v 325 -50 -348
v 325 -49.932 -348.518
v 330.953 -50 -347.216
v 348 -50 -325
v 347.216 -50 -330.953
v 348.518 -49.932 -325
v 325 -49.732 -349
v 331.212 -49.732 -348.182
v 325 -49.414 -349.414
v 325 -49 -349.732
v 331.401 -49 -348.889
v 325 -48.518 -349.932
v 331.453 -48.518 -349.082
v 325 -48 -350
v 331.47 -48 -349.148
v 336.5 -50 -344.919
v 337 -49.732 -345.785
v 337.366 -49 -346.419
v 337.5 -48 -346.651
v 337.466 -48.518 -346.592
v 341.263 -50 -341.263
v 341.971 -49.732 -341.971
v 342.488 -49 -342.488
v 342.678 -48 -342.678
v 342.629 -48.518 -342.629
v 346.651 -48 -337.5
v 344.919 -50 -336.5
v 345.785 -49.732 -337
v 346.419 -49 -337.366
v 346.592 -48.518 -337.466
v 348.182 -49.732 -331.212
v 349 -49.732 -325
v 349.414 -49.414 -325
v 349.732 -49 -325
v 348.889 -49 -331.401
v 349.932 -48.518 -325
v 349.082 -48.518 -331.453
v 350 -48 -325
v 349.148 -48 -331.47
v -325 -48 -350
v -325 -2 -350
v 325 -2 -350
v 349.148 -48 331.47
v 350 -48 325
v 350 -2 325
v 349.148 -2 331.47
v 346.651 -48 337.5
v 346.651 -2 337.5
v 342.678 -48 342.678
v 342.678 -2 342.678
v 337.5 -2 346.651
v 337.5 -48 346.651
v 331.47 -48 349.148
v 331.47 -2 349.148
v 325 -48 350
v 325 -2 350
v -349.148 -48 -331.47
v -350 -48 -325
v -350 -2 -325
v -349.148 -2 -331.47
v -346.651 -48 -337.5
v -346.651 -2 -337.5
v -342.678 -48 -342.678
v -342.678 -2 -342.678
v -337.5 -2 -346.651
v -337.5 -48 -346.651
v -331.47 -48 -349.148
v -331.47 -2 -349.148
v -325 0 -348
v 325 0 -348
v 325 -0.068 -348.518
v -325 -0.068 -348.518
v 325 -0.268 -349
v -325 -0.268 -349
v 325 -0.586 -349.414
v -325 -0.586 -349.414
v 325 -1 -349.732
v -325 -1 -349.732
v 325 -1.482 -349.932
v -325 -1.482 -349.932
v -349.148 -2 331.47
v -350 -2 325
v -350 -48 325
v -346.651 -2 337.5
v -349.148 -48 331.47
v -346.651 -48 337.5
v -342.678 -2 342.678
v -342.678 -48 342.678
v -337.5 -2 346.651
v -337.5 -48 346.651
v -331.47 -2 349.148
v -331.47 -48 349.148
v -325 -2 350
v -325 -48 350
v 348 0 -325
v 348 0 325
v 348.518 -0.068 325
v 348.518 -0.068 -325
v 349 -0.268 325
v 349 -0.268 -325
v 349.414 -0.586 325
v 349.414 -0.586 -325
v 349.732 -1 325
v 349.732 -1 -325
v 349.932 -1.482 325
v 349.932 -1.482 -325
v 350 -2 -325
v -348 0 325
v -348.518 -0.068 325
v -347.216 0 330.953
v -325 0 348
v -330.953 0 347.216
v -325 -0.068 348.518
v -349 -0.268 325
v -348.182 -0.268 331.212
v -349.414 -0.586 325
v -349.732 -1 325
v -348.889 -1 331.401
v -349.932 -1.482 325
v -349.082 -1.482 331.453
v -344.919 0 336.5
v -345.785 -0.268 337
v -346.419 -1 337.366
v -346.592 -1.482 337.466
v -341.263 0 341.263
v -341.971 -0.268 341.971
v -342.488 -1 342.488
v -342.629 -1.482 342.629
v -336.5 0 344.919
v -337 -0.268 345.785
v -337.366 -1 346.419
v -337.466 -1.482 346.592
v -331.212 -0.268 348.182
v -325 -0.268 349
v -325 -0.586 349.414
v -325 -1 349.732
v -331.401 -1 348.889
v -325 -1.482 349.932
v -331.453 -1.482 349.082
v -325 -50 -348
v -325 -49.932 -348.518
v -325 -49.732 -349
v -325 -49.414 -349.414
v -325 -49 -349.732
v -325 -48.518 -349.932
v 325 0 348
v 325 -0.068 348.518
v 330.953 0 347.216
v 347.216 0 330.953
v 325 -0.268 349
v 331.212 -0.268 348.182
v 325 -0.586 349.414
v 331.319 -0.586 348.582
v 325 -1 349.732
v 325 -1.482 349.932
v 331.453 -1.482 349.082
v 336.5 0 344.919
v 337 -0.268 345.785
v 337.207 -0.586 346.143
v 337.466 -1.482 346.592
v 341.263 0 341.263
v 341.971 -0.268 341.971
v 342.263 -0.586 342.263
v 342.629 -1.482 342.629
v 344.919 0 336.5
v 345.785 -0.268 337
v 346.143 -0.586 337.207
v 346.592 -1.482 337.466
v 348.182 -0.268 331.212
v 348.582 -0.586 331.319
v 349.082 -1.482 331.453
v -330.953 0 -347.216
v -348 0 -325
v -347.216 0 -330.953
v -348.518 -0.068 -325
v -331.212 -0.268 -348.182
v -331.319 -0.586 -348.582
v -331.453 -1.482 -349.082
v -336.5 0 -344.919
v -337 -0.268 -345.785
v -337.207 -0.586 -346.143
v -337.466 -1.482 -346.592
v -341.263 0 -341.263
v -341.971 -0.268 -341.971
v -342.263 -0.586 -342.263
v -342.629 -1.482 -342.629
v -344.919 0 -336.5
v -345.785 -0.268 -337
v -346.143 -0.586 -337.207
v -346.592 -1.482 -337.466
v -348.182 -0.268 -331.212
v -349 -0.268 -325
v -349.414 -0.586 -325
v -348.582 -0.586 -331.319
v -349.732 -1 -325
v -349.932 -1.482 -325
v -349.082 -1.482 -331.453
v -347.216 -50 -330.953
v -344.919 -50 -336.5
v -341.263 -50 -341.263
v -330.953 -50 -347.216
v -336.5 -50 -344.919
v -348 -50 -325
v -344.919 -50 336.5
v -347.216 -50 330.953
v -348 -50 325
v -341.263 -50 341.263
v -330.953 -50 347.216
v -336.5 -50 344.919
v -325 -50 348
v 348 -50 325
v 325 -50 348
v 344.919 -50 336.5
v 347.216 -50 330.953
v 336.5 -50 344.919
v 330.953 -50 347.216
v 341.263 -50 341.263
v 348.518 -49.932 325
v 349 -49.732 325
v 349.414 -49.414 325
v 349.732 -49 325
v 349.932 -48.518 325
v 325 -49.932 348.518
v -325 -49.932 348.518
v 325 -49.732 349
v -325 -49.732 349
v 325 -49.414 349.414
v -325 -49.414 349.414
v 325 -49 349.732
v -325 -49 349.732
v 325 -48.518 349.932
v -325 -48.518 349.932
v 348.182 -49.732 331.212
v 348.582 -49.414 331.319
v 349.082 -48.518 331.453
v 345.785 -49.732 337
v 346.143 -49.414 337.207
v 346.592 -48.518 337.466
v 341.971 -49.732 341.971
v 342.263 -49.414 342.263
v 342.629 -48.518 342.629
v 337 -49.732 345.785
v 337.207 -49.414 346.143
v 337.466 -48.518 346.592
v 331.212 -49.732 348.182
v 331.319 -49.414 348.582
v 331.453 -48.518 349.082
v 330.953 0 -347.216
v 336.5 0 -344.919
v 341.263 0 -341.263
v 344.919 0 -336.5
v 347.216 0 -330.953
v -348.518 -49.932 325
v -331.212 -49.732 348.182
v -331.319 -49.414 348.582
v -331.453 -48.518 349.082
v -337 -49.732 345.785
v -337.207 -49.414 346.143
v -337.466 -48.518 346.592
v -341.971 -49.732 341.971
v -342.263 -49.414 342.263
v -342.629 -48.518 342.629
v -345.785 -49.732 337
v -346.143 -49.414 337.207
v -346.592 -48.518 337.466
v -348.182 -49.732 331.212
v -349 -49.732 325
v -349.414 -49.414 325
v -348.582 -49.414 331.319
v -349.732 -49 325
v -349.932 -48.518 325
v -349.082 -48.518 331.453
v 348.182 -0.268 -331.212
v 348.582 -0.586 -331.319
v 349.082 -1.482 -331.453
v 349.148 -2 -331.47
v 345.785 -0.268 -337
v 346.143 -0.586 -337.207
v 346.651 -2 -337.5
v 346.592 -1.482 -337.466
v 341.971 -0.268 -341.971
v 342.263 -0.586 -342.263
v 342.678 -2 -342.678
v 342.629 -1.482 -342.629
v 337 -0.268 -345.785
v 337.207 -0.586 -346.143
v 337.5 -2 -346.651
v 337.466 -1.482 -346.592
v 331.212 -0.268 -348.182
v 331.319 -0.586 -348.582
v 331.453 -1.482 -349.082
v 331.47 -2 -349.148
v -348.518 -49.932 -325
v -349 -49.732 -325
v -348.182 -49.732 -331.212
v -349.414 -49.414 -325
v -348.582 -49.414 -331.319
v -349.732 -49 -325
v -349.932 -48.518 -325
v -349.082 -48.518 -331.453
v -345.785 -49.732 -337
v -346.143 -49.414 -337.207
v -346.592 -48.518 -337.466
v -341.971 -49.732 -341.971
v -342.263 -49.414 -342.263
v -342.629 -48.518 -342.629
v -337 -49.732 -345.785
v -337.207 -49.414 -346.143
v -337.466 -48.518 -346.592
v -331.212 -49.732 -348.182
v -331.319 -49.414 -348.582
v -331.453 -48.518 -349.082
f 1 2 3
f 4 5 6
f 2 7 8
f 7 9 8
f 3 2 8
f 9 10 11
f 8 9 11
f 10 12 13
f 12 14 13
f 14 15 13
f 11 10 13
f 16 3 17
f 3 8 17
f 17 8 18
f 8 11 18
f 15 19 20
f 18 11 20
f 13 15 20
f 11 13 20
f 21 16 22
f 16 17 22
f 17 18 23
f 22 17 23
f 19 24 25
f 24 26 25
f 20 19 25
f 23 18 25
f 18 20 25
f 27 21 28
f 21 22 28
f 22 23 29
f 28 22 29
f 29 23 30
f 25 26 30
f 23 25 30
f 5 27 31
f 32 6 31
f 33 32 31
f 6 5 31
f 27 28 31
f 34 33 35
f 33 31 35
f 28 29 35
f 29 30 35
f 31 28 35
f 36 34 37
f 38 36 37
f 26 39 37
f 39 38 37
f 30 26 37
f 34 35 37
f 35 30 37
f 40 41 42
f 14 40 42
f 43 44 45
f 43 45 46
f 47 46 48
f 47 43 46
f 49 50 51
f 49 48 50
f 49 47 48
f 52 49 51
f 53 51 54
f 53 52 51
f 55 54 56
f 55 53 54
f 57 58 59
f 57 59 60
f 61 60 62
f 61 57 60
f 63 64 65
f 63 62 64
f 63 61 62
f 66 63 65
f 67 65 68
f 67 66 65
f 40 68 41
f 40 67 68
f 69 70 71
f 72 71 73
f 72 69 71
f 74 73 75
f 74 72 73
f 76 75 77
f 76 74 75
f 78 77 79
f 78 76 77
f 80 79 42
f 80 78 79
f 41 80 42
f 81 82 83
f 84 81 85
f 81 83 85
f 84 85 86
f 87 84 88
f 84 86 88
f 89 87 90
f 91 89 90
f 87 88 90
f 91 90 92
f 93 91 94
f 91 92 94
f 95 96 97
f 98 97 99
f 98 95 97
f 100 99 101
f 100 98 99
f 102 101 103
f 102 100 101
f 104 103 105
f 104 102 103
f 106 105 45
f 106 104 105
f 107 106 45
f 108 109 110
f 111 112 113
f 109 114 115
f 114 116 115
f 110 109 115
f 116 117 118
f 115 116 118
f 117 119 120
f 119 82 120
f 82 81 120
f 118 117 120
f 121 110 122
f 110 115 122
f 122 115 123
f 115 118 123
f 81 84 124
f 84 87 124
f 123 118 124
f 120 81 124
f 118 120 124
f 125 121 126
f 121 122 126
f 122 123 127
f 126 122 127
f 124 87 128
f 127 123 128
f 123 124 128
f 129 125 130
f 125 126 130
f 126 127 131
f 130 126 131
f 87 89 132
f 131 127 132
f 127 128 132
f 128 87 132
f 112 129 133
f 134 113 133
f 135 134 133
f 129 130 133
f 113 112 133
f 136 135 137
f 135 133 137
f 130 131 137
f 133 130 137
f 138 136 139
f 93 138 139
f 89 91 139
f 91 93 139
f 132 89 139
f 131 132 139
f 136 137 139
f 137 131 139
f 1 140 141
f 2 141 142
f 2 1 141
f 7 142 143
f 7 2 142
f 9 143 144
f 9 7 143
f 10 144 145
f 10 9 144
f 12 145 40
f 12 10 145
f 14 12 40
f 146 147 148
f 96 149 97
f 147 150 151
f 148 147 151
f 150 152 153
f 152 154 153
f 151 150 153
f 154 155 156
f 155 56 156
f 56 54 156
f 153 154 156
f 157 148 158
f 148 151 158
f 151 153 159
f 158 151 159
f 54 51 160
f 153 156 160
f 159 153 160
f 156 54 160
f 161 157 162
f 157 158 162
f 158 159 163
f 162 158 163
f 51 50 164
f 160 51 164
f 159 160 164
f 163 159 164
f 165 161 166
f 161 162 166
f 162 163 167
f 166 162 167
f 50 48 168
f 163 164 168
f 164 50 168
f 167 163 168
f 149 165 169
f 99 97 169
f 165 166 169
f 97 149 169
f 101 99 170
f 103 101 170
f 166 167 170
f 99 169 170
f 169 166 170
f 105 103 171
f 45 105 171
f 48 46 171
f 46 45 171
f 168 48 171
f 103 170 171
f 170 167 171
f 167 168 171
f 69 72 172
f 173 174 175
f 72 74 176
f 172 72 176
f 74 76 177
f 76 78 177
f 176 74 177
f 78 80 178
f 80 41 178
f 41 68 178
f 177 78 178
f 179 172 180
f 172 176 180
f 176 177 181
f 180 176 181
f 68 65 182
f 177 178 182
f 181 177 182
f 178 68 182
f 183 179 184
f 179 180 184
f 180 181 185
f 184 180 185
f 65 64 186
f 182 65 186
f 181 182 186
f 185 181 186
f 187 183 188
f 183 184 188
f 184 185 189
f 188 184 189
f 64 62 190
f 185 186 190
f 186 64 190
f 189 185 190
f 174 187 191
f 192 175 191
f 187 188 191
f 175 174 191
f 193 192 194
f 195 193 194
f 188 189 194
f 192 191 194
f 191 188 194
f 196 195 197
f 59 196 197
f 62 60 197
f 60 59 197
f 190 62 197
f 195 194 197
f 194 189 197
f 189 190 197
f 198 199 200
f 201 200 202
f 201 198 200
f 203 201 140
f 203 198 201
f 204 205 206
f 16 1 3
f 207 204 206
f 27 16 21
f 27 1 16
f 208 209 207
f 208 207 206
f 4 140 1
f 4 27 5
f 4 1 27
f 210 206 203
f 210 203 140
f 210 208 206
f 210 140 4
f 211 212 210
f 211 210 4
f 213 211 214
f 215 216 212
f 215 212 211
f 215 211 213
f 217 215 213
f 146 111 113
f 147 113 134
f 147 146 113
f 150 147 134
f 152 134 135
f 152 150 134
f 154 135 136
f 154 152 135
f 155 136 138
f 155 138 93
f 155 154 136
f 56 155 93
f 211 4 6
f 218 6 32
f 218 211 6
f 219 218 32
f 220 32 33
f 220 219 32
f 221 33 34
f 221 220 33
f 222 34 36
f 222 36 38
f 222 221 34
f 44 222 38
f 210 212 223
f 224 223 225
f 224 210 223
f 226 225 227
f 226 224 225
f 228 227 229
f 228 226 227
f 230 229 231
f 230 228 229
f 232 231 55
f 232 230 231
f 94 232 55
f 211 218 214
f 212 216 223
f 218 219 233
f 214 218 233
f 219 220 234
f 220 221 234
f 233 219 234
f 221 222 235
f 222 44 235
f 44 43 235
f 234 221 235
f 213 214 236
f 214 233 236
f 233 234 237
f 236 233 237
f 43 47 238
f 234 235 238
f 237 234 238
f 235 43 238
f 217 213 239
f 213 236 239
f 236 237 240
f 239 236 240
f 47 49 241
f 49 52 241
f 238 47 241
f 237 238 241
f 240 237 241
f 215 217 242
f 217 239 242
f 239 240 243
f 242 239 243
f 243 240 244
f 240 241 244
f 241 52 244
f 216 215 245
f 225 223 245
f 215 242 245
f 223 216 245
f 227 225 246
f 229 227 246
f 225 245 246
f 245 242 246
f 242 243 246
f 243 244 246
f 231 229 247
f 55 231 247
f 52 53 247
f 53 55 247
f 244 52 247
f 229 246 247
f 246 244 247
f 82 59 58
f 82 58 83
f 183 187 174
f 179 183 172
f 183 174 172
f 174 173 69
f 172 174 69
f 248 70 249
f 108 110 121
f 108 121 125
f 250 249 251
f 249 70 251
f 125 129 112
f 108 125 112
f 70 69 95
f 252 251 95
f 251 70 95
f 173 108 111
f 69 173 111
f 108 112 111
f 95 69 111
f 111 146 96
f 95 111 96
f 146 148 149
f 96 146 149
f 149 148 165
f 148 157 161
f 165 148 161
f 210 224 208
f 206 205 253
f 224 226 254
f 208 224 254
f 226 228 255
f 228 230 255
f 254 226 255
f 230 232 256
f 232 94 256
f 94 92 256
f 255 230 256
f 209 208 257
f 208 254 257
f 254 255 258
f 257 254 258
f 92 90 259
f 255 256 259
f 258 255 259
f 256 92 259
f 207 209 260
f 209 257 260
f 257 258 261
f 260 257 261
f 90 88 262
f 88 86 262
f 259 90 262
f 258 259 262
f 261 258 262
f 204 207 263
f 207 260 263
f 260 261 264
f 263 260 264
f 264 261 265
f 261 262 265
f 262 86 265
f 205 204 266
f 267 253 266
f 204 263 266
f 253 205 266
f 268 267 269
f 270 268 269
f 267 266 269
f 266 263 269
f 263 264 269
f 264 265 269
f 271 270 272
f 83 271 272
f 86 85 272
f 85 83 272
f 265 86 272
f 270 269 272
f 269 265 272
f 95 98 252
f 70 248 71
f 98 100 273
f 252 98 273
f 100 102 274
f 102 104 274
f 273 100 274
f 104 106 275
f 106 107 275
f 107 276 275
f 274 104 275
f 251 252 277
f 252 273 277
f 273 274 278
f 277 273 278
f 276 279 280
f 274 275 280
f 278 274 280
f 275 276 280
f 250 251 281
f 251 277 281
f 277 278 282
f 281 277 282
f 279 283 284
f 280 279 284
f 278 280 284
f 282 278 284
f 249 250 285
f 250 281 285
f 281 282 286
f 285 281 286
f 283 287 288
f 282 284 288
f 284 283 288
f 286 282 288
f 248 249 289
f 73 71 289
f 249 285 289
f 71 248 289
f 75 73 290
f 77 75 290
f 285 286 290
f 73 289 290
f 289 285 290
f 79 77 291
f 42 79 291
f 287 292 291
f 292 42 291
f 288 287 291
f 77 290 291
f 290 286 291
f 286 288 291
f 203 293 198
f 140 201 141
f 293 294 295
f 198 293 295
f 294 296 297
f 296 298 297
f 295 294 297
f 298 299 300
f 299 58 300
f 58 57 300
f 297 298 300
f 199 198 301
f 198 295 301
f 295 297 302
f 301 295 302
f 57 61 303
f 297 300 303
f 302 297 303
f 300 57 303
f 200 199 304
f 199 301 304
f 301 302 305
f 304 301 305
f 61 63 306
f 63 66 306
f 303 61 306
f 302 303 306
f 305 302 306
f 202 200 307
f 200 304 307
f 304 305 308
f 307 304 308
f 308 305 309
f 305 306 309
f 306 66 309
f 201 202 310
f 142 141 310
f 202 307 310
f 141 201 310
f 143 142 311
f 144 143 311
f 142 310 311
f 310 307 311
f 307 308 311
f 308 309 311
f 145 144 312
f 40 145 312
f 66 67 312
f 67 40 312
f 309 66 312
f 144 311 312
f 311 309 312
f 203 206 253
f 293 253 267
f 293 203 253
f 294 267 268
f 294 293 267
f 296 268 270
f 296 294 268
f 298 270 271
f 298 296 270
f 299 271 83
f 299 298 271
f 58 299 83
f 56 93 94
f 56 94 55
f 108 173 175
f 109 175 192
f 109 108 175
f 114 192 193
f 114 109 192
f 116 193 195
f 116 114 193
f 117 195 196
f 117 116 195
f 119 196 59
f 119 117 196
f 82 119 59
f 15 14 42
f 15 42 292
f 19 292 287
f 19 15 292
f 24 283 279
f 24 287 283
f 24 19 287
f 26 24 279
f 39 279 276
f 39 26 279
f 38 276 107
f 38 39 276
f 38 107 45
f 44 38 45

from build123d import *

# Parameters (mm, degrees)
F0_W     = 700
F0_H     = 700
F1_DEPTH = 50
F2_R     = 25
F3_R     = 2


with BuildPart() as f1:
    # F0 (on Front) → F1 (new body)
    with BuildSketch(Plane.XZ):
        Rectangle(F0_W, F0_H)
    extrude(amount=F1_DEPTH)

    # F2
    f2_edges = [f1.edges().sort_by_distance(p)[0] for p in [
        (-350, -25, 350),
        (-350, -25, -350),
        (350, -25, -350),
        (350, -25, 350),
    ]]
    fillet(f2_edges, radius=F2_R)

    # F3
    f3_edges = [f1.edges().sort_by_distance(p)[0] for p in [
        (350, -50, 0),
        (0, -50, 350),
        (-350, -50, 0),
        (-342.67767, -50, 342.67767),
        (-342.67767, -50, -342.67767),
        (0, -50, -350),
        (342.67767, -50, -342.67767),
        (342.67767, -50, 342.67767),
        (0, 0, 350),
        (342.67767, 0, 342.67767),
        (350, 0, 0),
        (342.67767, 0, -342.67767),
        (0, 0, -350),
        (-342.67767, 0, -342.67767),
        (-350, 0, 0),
        (-342.67767, 0, 342.67767),
    ]]
    fillet(f3_edges, radius=F3_R)


solid = f1.part
